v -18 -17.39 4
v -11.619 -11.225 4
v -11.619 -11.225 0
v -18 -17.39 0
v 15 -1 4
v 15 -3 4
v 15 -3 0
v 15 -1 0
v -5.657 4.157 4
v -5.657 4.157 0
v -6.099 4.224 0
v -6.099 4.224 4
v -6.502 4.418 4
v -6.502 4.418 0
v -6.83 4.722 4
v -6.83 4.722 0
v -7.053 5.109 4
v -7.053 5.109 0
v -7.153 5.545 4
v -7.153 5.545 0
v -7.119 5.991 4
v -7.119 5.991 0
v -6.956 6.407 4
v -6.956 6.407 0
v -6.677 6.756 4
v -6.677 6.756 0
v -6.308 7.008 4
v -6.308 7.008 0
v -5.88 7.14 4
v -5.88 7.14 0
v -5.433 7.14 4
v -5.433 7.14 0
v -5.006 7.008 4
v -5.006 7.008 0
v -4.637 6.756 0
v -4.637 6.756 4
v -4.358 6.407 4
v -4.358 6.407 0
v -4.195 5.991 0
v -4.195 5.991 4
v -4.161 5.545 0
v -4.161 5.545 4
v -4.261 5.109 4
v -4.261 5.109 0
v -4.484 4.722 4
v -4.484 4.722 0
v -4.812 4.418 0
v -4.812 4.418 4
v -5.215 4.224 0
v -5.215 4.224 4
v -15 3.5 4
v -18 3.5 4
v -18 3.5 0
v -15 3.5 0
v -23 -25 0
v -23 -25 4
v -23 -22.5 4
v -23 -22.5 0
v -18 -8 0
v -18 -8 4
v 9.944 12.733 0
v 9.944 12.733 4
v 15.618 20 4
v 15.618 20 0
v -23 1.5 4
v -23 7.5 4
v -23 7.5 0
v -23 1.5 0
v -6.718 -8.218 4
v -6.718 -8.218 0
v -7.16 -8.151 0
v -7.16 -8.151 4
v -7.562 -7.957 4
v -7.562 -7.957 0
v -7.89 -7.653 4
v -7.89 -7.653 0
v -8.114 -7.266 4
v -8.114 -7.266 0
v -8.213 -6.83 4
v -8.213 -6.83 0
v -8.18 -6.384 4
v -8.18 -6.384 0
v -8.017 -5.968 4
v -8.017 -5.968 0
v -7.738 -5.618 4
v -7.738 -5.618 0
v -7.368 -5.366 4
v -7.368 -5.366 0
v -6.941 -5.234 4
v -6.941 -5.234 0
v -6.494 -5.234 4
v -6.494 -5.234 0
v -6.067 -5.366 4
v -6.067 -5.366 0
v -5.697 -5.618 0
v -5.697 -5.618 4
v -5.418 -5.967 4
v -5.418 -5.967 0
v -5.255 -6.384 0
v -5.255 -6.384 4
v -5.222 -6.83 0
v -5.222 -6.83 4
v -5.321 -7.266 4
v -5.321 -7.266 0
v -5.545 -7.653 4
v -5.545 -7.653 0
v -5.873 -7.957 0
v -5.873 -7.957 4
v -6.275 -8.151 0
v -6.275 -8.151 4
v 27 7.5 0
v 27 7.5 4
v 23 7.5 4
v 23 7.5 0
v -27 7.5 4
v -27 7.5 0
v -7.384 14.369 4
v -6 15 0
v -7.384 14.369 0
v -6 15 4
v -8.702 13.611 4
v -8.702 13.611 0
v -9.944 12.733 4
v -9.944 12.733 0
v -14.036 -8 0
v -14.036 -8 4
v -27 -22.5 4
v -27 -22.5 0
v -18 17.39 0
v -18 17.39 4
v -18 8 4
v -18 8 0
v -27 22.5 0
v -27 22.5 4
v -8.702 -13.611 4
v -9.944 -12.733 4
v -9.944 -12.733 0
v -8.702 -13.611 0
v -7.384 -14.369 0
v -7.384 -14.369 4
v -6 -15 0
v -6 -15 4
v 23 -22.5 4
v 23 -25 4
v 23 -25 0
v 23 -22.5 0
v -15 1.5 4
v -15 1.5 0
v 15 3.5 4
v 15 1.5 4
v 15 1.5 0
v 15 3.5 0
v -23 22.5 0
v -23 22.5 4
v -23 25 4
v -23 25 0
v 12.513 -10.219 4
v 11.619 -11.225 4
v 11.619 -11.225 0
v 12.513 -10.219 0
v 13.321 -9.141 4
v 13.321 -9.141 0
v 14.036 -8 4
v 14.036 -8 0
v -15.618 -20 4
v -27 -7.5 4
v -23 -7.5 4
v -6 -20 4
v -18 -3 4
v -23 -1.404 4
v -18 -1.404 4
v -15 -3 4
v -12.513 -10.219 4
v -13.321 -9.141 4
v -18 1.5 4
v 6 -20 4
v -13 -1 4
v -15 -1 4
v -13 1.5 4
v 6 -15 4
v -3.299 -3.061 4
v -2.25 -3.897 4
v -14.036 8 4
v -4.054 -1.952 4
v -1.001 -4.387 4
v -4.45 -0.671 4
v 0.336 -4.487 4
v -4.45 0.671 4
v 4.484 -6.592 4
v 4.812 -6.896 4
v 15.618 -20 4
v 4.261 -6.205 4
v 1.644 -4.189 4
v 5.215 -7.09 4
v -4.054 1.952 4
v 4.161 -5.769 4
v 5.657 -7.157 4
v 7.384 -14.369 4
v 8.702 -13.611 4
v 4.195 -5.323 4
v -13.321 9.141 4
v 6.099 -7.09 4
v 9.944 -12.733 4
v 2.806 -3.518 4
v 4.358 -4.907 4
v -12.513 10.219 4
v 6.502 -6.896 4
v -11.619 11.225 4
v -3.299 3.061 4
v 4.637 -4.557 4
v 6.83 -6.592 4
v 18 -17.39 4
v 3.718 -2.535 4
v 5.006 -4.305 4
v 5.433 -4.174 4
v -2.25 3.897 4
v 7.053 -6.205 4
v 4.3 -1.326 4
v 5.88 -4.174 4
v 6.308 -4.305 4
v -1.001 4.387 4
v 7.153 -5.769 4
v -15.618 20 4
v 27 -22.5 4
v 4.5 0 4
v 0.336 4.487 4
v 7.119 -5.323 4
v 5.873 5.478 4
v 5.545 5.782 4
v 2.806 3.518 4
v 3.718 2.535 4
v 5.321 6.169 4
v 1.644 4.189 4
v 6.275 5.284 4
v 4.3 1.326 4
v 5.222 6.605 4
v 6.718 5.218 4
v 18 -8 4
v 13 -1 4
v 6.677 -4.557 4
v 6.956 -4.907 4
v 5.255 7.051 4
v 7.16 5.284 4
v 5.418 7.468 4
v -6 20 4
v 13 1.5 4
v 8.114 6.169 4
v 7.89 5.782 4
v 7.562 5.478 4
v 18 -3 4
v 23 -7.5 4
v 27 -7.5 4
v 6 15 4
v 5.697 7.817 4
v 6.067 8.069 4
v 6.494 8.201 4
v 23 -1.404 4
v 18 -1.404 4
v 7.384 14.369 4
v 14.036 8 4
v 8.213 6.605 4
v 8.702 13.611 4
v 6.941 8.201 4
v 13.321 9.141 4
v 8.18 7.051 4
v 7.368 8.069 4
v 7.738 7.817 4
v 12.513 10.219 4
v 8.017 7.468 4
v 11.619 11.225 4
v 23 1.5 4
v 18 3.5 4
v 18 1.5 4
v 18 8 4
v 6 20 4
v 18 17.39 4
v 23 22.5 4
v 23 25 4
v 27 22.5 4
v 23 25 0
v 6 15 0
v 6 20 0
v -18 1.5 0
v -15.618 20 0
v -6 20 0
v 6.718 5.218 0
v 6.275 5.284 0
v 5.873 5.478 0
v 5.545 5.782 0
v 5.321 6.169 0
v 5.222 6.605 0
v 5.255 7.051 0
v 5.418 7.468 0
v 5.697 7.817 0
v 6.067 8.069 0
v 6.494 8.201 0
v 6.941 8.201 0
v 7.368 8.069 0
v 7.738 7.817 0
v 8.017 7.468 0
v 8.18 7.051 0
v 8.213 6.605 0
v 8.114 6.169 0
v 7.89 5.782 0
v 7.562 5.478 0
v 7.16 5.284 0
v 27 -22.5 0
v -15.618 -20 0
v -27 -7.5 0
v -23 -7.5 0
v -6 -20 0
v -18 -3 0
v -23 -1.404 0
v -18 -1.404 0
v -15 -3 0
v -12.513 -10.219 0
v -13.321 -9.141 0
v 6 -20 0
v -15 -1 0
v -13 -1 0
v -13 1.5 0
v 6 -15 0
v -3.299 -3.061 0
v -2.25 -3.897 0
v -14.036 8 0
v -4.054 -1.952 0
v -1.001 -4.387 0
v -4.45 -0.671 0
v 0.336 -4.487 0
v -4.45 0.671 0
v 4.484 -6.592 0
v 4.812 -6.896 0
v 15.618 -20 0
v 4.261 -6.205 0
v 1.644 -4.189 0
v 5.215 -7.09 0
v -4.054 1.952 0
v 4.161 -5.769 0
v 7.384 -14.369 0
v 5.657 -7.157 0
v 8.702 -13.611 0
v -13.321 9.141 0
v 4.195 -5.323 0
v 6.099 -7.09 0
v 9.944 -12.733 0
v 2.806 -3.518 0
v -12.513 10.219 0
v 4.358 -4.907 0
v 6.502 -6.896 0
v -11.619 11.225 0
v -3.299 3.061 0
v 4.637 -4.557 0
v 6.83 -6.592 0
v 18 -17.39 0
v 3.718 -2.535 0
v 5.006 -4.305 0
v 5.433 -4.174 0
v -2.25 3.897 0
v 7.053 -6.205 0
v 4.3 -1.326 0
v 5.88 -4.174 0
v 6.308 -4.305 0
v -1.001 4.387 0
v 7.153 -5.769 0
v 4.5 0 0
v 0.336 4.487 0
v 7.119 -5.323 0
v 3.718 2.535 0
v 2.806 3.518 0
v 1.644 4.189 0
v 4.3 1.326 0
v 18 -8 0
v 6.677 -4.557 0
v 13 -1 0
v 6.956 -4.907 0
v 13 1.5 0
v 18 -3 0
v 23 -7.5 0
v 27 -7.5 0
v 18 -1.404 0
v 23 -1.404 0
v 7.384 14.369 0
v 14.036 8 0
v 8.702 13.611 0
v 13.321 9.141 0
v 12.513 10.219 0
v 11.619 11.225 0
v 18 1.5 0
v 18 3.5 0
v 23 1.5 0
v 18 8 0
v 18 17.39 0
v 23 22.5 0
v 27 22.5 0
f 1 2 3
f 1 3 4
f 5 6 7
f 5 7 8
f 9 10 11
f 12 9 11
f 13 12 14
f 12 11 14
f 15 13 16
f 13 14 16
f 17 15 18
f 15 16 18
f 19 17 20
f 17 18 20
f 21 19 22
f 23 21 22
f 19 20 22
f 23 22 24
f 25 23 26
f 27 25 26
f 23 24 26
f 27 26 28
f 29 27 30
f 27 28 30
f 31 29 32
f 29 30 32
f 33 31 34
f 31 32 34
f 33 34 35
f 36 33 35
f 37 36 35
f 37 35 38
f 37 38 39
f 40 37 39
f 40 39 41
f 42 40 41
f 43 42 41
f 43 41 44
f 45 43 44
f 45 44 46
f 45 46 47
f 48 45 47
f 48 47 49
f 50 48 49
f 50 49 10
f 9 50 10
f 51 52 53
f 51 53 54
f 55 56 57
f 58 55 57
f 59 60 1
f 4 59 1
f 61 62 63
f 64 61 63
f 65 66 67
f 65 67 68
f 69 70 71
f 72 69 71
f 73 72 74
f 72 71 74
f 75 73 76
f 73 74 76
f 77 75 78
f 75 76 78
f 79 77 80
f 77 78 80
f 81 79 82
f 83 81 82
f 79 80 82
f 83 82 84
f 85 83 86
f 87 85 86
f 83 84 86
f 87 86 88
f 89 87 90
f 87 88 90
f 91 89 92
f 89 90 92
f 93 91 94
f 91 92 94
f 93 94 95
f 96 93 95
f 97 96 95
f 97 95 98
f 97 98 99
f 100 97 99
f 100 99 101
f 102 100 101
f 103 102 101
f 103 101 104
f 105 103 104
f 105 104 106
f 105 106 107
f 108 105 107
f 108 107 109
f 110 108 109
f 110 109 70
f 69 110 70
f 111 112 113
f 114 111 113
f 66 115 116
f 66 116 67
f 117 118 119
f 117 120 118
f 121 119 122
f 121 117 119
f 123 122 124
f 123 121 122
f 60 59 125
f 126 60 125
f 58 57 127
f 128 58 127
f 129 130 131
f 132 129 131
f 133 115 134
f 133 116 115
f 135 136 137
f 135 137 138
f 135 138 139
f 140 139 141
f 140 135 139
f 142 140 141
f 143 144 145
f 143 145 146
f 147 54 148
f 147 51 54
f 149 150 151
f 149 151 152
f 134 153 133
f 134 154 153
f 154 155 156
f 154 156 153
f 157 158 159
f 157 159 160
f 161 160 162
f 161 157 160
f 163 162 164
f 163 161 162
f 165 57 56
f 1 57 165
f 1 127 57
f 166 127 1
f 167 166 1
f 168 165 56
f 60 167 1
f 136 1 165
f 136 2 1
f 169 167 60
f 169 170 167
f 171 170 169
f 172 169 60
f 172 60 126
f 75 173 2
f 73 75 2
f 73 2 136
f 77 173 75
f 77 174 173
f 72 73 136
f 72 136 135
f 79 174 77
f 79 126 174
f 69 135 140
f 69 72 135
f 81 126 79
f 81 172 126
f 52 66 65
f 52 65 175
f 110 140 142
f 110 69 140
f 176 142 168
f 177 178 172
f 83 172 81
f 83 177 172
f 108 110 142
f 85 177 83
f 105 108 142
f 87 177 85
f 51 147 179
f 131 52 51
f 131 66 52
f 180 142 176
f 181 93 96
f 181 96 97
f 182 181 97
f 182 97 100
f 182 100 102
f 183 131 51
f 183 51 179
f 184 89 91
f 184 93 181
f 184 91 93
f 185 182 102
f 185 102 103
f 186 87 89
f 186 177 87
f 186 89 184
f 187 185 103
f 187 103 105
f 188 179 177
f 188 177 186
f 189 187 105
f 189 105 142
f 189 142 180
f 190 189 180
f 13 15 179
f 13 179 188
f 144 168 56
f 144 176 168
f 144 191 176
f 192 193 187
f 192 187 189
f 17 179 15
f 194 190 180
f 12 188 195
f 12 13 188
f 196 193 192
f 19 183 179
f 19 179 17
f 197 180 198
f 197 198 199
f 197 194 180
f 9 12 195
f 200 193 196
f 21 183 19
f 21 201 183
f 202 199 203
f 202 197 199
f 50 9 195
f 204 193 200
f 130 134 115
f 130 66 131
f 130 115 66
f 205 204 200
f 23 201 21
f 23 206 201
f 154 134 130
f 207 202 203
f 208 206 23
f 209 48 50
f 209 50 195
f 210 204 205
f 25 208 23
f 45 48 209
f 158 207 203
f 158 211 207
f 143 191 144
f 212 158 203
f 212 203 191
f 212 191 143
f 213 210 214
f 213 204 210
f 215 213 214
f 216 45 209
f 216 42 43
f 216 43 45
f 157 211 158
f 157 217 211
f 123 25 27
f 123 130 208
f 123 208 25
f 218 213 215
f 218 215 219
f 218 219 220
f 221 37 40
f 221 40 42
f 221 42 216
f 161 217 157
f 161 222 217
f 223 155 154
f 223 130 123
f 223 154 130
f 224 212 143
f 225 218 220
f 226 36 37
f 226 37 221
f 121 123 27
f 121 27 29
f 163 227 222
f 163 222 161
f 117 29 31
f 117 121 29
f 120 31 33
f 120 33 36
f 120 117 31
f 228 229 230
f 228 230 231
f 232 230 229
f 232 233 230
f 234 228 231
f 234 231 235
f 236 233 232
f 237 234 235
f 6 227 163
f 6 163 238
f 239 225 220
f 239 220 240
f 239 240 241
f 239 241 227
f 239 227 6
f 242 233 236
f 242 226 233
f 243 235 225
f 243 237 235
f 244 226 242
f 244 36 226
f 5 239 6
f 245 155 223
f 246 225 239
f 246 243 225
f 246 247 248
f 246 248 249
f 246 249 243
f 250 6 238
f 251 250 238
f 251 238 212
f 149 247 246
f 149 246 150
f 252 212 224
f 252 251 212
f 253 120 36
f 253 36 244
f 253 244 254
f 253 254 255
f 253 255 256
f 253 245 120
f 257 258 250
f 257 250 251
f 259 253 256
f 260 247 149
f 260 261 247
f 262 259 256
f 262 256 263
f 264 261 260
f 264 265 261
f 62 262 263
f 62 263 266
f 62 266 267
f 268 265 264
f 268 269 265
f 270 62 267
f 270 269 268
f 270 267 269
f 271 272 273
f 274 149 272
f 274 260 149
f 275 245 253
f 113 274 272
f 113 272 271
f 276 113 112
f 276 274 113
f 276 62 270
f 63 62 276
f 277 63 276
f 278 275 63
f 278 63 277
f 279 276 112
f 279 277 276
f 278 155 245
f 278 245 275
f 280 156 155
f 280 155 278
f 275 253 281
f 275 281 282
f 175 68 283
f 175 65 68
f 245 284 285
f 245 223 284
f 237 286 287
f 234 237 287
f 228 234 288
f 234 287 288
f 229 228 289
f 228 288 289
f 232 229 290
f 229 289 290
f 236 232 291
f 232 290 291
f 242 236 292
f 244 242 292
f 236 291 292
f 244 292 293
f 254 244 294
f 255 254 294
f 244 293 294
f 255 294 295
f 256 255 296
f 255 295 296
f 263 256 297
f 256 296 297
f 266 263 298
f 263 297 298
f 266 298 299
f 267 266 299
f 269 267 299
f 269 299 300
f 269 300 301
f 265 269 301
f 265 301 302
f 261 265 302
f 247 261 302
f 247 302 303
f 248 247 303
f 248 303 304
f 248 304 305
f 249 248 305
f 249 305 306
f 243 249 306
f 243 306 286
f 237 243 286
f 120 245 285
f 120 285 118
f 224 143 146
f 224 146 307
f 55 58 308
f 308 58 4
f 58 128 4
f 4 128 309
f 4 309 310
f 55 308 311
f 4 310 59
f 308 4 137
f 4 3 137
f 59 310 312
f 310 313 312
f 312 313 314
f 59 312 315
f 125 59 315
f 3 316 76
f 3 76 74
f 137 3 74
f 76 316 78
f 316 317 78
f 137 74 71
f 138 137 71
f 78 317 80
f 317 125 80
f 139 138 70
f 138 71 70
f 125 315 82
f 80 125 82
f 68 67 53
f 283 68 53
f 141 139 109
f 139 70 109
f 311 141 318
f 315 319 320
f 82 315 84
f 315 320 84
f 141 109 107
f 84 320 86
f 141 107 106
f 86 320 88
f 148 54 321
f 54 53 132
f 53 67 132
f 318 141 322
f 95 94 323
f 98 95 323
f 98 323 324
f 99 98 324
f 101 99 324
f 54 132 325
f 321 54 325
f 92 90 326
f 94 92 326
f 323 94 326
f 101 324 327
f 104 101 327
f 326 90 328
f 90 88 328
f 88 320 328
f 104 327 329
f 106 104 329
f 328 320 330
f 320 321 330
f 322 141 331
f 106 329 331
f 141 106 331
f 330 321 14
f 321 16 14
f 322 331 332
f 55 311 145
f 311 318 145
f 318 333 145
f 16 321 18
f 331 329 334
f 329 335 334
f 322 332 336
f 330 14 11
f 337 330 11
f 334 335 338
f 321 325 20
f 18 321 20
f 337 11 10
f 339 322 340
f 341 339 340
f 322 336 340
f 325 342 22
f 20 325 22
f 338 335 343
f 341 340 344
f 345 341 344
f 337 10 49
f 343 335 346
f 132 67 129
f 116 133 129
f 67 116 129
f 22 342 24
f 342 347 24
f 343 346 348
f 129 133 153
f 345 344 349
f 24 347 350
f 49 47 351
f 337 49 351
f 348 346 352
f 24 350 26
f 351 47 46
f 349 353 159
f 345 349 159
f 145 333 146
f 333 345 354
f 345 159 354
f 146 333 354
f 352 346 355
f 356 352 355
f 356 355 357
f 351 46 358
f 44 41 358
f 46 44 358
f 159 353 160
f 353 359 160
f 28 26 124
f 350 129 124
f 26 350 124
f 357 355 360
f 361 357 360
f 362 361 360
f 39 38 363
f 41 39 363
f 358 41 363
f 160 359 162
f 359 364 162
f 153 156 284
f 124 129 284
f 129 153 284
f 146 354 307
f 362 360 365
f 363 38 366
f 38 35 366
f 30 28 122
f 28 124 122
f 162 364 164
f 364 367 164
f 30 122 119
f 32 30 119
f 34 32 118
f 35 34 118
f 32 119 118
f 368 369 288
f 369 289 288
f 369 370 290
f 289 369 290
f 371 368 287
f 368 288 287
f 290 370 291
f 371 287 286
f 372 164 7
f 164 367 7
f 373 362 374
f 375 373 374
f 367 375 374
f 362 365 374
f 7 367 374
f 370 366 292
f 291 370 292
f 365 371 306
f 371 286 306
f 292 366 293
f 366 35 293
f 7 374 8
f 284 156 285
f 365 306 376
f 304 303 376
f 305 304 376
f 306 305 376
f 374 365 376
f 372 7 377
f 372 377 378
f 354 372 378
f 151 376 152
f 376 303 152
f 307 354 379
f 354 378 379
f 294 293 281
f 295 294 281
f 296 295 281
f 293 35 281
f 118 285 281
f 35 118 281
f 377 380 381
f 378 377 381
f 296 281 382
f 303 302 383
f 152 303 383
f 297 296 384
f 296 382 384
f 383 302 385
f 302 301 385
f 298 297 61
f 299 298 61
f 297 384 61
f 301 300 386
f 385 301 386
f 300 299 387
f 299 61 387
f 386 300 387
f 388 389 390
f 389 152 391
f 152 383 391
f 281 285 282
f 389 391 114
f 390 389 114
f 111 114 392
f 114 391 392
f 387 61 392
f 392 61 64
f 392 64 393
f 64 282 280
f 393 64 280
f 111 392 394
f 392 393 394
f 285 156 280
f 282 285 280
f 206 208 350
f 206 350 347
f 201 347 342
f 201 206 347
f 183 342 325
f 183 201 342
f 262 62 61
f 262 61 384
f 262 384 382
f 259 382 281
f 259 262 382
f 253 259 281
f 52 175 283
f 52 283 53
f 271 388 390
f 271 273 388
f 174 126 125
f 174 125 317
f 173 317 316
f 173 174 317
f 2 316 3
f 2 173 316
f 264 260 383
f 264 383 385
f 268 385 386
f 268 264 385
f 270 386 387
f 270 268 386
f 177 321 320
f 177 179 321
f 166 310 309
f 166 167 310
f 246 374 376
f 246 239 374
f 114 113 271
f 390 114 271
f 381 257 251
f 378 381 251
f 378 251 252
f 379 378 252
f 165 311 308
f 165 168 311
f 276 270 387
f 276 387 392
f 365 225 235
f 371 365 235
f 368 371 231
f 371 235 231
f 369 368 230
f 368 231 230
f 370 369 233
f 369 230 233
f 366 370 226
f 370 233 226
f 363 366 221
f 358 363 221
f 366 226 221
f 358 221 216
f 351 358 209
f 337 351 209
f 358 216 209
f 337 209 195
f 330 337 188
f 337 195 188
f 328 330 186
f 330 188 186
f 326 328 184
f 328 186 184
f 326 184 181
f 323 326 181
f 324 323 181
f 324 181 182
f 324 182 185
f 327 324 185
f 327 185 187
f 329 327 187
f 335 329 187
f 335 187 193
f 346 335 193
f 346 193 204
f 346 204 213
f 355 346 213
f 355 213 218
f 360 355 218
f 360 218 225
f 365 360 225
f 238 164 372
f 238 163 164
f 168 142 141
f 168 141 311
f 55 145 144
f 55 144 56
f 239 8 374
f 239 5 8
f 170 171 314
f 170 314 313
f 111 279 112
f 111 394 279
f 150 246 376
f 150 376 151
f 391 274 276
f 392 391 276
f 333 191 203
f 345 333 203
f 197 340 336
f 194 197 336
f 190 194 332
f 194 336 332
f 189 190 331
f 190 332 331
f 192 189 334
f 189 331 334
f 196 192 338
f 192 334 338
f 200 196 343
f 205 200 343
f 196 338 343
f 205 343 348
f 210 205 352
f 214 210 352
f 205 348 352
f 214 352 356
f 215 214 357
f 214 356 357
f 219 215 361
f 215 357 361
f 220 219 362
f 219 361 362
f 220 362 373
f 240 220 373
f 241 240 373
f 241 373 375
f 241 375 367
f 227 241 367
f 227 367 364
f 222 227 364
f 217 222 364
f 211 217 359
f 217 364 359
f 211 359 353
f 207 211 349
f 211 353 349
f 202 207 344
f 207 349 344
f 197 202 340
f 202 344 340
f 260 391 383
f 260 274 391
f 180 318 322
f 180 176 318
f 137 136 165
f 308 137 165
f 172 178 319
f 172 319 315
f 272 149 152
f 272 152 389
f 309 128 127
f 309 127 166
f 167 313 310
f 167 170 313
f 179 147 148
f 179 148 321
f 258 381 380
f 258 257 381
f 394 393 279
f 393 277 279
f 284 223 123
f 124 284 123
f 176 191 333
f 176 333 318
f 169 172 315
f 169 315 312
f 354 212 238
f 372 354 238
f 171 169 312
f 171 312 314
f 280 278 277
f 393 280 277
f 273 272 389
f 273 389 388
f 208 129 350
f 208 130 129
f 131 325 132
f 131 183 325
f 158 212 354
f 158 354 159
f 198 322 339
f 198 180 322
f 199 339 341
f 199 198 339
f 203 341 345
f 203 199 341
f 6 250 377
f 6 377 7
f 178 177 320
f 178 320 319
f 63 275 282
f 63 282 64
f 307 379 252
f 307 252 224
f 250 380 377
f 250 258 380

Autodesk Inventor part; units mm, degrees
ref_plane "YZ Plane" through (0, 0, 0) normal (1, 0, 0) x (0, 1, 0)
ref_plane "XZ Plane" through (0, 0, 0) normal (0, 1, 0) x (-1, 0, 0)
ref_plane "XY Plane" through (0, 0, 0) normal (0, 0, 1) x (1, 0, 0)
sketch "Sketch1" plane through (0, 0, 0) normal (0, 0, 1) x (1, 0, 0)
  line L0 (-27, 25) -> (27, 25)
  line L1 (27, 25) -> (27, -25)
  line L2 (27, -25) -> (-27, -25)
  line L3 (-27, -25) -> (-27, 25)
  point P0 (0, 0)
  dimension "d0" = 54
  dimension "d1" = 50
  dimension "d2" = 25
  dimension "d3" = 27
extrude "Base" add sketch "Sketch1" along normal blind 4
sketch "Sketch2" plane through (0, 0, 4) normal (0, 0, 1) x (1, 0, 0)
  line L0 (-27, -25) -> (-27, 25) projected
  line L1 (0, 23.0221) -> (0, -15.4934) construction
  line L2 (-23.6958, 0) -> (15.7708, 0) construction
  line L3 (-27, 7.5) -> (-23, 7.5)
  line L4 (-23, 7.5) -> (-23, -7.5)
  line L5 (-23, -7.5) -> (-27, -7.5)
  line L6 (-27, -7.5) -> (-27, 7.5)
  line L7 (-27, 25) -> (-23, 25)
  line L8 (-23, 25) -> (-23, 22.5)
  line L9 (-23, 22.5) -> (-27, 22.5)
  line L10 (-27, 22.5) -> (-27, 25)
  line L11 (-27, -25) -> (-23, -25)
  line L12 (-23, -25) -> (-23, -22.5)
  line L13 (-23, -22.5) -> (-27, -22.5)
  line L14 (-27, -22.5) -> (-27, -25)
  line L15 (27, 7.5) -> (23, 7.5)
  line L16 (23, 7.5) -> (23, -7.5)
  line L17 (23, -7.5) -> (27, -7.5)
  line L18 (27, -7.5) -> (27, 7.5)
  line L19 (27, 25) -> (23, 25)
  line L20 (23, 25) -> (23, 22.5)
  line L21 (23, 22.5) -> (27, 22.5)
  line L22 (27, 22.5) -> (27, 25)
  line L23 (27, -25) -> (23, -25)
  line L24 (23, -25) -> (23, -22.5)
  line L25 (23, -22.5) -> (27, -22.5)
  line L26 (27, -22.5) -> (27, -25)
  point P0 (0, 0)
  point P1 (23.6958, 0)
  dimension "d9" = 4
  dimension "d10" = 15
  dimension "d11" = 4
  dimension "d13" = 7.5
  dimension "d14" = 15
  dimension "d15" = 15
  dimension "d16" = 4
extrude "Sleeves" cut sketch "Sketch2" against normal blind 4
sketch "Sketch3" plane through (0, 0, 4) normal (0, 0, 1) x (1, 0, 0)
  line L0 (0, 0) -> (-5.6569, 5.6569) construction
  line L1 (0, 0) -> (8, 0) construction
  line L2 (0, 0) -> (6.7175, 6.7175) construction
  line L3 (0, 0) -> (-6.7175, -6.7175) construction
  line L4 (0, 0) -> (5.6569, -5.6569) construction
  dimension "d19" = 8
  dimension "d20" = 135
  dimension "d21" = 9.5
  dimension "d22" = 9.5
  dimension "d23" = 8
hole "MotorMounts" at (6.7175, 6.7175, 4) at (-5.6569, 5.6569, 4) at (-6.7175, -6.7175, 4) at (5.6569, -5.6569, 4) direction (0, 0, -1) diameter 3 end through all
sketch "Sketch4" plane through (0, 0, 4) normal (0, 0, 1) x (1, 0, 0)
  circle A0 centre (0, 0) radius 4.5
  dimension "d31" = 9
extrude "ShaftClearance" cut sketch "Sketch4" against normal through all
sketch "Sketch5" plane through (0, 0, 4) normal (0, 0, 1) x (1, 0, 0)
  circle A0 centre (0, 0) radius 4.5 projected
  line L0 (-23, 7.5) -> (-23, -7.5) projected
  line L1 (23, -7.5) -> (23, 7.5) projected
  line L2 (-23, 1.5) -> (-18, 1.5)
  line L3 (-18, 1.5) -> (-18, 3.5)
  line L4 (-18, 3.5) -> (-15, 3.5)
  line L5 (-15, 3.5) -> (-15, 1.5)
  line L6 (-15, 1.5) -> (-13, 1.5)
  line L7 (-13, 1.5) -> (-13, -1)
  line L8 (-13, -1) -> (-15, -1)
  line L9 (-15, -1) -> (-15, -3)
  line L10 (-15, -3) -> (-18, -3)
  line L11 (-18, -3) -> (-18, -1.4035)
  line L12 (-18, -1.4035) -> (-23, -1.4035)
  line L13 (-23, -1.4035) -> (-23, 1.5)
  dimension "d34" = 5
  dimension "d35" = 2
  dimension "d36" = 3
  dimension "d37" = 2
  dimension "d38" = 2.5
  dimension "d39" = 2
  dimension "d40" = 3
  dimension "d41" = 1.5
extrude "ScrewLock" cut sketch "Sketch5" against normal blind 10 contours L2 L3 L4 L5 L6 L7 L8 L9 L10 L11 L12 L0
mirror "ScrewLockDoubler" about plane through (0, 0, 0) normal (1, 0, 0) of "ScrewLock"
sketch "Sketch6" plane through (0, 0, 4) normal (0, 0, 1) x (1, 0, 0)
  line L0 (-23, 25) -> (23, 25) projected
  line L1 (-23, 25) -> (-23, 22.5) projected
  line L2 (18, 3.5) -> (18, 1.5) projected
  line L3 (-18, 20) -> (-6, 20)
  line L4 (-6, 20) -> (-6, 15)
  line L5 (-18, 20) -> (-18, 8)
  line L6 (15, 3.5) -> (18, 3.5) projected
  circle A0 centre (0, 0) radius 4.5 projected
  arc A1 (-6, 15) -> (-14.0357, 8) centre (0, 0) ccw
  line L7 (-14.0357, 8) -> (-18, 8)
  dimension "d44" = 5
  dimension "d45" = 12
  dimension "d46" = 12
  dimension "d48" = 5
  dimension "d49" = 5
extrude "CornerCutout" cut sketch "Sketch6" against normal blind 10 contours L3 L4 A1 L7 L5
sketch "Sketch7" plane through (0, 0, 4) normal (0, 0, 1) x (1, 0, 0)
  line L0 (-18, 8) -> (-18, 20) projected
  line L1 (-18, 20) -> (-6, 20) projected
  arc A0 (-6, 15) -> (-14.0357, 8) centre (0, 0) ccw projected
  line L2 (18, 3.5) -> (18, 1.5) projected
  circle A1 centre (0, 0) radius 4.5 projected
  line L3 (0, 0) -> (-18.1317, 23.2182) construction
  line L4 (0, 0) -> (-21.2105, 20.4919) construction
  line L5 (0, 0) -> (-18, 20) construction
  line L6 (-15.6185, 20) -> (-9.9435, 12.7329)
  line L7 (-15.6185, 20) -> (-18, 20)
  line L8 (-18, 17.3902) -> (-18, 20)
  line L9 (-18, 17.3902) -> (-11.6188, 11.2251)
  arc A2 (-9.9435, 12.7329) -> (-11.6188, 11.2251) centre (0, 0) ccw
  dimension "d52" = 8
  dimension "d54" = 4
extrude "DiagonalSupport" add sketch "Sketch7" against normal blind 4 contours L0 L1 L6 A0 L9
mirror "CornerDoubler" about plane through (0, 0, 0) normal (0, 1, 0) of "CornerCutout", "DiagonalSupport"
mirror "CornerQuadrupler" about plane through (0, 0, 0) normal (1, 0, 0) of "CornerCutout", "CornerDoubler", "DiagonalSupport"
properties part number "MotorSupport"
